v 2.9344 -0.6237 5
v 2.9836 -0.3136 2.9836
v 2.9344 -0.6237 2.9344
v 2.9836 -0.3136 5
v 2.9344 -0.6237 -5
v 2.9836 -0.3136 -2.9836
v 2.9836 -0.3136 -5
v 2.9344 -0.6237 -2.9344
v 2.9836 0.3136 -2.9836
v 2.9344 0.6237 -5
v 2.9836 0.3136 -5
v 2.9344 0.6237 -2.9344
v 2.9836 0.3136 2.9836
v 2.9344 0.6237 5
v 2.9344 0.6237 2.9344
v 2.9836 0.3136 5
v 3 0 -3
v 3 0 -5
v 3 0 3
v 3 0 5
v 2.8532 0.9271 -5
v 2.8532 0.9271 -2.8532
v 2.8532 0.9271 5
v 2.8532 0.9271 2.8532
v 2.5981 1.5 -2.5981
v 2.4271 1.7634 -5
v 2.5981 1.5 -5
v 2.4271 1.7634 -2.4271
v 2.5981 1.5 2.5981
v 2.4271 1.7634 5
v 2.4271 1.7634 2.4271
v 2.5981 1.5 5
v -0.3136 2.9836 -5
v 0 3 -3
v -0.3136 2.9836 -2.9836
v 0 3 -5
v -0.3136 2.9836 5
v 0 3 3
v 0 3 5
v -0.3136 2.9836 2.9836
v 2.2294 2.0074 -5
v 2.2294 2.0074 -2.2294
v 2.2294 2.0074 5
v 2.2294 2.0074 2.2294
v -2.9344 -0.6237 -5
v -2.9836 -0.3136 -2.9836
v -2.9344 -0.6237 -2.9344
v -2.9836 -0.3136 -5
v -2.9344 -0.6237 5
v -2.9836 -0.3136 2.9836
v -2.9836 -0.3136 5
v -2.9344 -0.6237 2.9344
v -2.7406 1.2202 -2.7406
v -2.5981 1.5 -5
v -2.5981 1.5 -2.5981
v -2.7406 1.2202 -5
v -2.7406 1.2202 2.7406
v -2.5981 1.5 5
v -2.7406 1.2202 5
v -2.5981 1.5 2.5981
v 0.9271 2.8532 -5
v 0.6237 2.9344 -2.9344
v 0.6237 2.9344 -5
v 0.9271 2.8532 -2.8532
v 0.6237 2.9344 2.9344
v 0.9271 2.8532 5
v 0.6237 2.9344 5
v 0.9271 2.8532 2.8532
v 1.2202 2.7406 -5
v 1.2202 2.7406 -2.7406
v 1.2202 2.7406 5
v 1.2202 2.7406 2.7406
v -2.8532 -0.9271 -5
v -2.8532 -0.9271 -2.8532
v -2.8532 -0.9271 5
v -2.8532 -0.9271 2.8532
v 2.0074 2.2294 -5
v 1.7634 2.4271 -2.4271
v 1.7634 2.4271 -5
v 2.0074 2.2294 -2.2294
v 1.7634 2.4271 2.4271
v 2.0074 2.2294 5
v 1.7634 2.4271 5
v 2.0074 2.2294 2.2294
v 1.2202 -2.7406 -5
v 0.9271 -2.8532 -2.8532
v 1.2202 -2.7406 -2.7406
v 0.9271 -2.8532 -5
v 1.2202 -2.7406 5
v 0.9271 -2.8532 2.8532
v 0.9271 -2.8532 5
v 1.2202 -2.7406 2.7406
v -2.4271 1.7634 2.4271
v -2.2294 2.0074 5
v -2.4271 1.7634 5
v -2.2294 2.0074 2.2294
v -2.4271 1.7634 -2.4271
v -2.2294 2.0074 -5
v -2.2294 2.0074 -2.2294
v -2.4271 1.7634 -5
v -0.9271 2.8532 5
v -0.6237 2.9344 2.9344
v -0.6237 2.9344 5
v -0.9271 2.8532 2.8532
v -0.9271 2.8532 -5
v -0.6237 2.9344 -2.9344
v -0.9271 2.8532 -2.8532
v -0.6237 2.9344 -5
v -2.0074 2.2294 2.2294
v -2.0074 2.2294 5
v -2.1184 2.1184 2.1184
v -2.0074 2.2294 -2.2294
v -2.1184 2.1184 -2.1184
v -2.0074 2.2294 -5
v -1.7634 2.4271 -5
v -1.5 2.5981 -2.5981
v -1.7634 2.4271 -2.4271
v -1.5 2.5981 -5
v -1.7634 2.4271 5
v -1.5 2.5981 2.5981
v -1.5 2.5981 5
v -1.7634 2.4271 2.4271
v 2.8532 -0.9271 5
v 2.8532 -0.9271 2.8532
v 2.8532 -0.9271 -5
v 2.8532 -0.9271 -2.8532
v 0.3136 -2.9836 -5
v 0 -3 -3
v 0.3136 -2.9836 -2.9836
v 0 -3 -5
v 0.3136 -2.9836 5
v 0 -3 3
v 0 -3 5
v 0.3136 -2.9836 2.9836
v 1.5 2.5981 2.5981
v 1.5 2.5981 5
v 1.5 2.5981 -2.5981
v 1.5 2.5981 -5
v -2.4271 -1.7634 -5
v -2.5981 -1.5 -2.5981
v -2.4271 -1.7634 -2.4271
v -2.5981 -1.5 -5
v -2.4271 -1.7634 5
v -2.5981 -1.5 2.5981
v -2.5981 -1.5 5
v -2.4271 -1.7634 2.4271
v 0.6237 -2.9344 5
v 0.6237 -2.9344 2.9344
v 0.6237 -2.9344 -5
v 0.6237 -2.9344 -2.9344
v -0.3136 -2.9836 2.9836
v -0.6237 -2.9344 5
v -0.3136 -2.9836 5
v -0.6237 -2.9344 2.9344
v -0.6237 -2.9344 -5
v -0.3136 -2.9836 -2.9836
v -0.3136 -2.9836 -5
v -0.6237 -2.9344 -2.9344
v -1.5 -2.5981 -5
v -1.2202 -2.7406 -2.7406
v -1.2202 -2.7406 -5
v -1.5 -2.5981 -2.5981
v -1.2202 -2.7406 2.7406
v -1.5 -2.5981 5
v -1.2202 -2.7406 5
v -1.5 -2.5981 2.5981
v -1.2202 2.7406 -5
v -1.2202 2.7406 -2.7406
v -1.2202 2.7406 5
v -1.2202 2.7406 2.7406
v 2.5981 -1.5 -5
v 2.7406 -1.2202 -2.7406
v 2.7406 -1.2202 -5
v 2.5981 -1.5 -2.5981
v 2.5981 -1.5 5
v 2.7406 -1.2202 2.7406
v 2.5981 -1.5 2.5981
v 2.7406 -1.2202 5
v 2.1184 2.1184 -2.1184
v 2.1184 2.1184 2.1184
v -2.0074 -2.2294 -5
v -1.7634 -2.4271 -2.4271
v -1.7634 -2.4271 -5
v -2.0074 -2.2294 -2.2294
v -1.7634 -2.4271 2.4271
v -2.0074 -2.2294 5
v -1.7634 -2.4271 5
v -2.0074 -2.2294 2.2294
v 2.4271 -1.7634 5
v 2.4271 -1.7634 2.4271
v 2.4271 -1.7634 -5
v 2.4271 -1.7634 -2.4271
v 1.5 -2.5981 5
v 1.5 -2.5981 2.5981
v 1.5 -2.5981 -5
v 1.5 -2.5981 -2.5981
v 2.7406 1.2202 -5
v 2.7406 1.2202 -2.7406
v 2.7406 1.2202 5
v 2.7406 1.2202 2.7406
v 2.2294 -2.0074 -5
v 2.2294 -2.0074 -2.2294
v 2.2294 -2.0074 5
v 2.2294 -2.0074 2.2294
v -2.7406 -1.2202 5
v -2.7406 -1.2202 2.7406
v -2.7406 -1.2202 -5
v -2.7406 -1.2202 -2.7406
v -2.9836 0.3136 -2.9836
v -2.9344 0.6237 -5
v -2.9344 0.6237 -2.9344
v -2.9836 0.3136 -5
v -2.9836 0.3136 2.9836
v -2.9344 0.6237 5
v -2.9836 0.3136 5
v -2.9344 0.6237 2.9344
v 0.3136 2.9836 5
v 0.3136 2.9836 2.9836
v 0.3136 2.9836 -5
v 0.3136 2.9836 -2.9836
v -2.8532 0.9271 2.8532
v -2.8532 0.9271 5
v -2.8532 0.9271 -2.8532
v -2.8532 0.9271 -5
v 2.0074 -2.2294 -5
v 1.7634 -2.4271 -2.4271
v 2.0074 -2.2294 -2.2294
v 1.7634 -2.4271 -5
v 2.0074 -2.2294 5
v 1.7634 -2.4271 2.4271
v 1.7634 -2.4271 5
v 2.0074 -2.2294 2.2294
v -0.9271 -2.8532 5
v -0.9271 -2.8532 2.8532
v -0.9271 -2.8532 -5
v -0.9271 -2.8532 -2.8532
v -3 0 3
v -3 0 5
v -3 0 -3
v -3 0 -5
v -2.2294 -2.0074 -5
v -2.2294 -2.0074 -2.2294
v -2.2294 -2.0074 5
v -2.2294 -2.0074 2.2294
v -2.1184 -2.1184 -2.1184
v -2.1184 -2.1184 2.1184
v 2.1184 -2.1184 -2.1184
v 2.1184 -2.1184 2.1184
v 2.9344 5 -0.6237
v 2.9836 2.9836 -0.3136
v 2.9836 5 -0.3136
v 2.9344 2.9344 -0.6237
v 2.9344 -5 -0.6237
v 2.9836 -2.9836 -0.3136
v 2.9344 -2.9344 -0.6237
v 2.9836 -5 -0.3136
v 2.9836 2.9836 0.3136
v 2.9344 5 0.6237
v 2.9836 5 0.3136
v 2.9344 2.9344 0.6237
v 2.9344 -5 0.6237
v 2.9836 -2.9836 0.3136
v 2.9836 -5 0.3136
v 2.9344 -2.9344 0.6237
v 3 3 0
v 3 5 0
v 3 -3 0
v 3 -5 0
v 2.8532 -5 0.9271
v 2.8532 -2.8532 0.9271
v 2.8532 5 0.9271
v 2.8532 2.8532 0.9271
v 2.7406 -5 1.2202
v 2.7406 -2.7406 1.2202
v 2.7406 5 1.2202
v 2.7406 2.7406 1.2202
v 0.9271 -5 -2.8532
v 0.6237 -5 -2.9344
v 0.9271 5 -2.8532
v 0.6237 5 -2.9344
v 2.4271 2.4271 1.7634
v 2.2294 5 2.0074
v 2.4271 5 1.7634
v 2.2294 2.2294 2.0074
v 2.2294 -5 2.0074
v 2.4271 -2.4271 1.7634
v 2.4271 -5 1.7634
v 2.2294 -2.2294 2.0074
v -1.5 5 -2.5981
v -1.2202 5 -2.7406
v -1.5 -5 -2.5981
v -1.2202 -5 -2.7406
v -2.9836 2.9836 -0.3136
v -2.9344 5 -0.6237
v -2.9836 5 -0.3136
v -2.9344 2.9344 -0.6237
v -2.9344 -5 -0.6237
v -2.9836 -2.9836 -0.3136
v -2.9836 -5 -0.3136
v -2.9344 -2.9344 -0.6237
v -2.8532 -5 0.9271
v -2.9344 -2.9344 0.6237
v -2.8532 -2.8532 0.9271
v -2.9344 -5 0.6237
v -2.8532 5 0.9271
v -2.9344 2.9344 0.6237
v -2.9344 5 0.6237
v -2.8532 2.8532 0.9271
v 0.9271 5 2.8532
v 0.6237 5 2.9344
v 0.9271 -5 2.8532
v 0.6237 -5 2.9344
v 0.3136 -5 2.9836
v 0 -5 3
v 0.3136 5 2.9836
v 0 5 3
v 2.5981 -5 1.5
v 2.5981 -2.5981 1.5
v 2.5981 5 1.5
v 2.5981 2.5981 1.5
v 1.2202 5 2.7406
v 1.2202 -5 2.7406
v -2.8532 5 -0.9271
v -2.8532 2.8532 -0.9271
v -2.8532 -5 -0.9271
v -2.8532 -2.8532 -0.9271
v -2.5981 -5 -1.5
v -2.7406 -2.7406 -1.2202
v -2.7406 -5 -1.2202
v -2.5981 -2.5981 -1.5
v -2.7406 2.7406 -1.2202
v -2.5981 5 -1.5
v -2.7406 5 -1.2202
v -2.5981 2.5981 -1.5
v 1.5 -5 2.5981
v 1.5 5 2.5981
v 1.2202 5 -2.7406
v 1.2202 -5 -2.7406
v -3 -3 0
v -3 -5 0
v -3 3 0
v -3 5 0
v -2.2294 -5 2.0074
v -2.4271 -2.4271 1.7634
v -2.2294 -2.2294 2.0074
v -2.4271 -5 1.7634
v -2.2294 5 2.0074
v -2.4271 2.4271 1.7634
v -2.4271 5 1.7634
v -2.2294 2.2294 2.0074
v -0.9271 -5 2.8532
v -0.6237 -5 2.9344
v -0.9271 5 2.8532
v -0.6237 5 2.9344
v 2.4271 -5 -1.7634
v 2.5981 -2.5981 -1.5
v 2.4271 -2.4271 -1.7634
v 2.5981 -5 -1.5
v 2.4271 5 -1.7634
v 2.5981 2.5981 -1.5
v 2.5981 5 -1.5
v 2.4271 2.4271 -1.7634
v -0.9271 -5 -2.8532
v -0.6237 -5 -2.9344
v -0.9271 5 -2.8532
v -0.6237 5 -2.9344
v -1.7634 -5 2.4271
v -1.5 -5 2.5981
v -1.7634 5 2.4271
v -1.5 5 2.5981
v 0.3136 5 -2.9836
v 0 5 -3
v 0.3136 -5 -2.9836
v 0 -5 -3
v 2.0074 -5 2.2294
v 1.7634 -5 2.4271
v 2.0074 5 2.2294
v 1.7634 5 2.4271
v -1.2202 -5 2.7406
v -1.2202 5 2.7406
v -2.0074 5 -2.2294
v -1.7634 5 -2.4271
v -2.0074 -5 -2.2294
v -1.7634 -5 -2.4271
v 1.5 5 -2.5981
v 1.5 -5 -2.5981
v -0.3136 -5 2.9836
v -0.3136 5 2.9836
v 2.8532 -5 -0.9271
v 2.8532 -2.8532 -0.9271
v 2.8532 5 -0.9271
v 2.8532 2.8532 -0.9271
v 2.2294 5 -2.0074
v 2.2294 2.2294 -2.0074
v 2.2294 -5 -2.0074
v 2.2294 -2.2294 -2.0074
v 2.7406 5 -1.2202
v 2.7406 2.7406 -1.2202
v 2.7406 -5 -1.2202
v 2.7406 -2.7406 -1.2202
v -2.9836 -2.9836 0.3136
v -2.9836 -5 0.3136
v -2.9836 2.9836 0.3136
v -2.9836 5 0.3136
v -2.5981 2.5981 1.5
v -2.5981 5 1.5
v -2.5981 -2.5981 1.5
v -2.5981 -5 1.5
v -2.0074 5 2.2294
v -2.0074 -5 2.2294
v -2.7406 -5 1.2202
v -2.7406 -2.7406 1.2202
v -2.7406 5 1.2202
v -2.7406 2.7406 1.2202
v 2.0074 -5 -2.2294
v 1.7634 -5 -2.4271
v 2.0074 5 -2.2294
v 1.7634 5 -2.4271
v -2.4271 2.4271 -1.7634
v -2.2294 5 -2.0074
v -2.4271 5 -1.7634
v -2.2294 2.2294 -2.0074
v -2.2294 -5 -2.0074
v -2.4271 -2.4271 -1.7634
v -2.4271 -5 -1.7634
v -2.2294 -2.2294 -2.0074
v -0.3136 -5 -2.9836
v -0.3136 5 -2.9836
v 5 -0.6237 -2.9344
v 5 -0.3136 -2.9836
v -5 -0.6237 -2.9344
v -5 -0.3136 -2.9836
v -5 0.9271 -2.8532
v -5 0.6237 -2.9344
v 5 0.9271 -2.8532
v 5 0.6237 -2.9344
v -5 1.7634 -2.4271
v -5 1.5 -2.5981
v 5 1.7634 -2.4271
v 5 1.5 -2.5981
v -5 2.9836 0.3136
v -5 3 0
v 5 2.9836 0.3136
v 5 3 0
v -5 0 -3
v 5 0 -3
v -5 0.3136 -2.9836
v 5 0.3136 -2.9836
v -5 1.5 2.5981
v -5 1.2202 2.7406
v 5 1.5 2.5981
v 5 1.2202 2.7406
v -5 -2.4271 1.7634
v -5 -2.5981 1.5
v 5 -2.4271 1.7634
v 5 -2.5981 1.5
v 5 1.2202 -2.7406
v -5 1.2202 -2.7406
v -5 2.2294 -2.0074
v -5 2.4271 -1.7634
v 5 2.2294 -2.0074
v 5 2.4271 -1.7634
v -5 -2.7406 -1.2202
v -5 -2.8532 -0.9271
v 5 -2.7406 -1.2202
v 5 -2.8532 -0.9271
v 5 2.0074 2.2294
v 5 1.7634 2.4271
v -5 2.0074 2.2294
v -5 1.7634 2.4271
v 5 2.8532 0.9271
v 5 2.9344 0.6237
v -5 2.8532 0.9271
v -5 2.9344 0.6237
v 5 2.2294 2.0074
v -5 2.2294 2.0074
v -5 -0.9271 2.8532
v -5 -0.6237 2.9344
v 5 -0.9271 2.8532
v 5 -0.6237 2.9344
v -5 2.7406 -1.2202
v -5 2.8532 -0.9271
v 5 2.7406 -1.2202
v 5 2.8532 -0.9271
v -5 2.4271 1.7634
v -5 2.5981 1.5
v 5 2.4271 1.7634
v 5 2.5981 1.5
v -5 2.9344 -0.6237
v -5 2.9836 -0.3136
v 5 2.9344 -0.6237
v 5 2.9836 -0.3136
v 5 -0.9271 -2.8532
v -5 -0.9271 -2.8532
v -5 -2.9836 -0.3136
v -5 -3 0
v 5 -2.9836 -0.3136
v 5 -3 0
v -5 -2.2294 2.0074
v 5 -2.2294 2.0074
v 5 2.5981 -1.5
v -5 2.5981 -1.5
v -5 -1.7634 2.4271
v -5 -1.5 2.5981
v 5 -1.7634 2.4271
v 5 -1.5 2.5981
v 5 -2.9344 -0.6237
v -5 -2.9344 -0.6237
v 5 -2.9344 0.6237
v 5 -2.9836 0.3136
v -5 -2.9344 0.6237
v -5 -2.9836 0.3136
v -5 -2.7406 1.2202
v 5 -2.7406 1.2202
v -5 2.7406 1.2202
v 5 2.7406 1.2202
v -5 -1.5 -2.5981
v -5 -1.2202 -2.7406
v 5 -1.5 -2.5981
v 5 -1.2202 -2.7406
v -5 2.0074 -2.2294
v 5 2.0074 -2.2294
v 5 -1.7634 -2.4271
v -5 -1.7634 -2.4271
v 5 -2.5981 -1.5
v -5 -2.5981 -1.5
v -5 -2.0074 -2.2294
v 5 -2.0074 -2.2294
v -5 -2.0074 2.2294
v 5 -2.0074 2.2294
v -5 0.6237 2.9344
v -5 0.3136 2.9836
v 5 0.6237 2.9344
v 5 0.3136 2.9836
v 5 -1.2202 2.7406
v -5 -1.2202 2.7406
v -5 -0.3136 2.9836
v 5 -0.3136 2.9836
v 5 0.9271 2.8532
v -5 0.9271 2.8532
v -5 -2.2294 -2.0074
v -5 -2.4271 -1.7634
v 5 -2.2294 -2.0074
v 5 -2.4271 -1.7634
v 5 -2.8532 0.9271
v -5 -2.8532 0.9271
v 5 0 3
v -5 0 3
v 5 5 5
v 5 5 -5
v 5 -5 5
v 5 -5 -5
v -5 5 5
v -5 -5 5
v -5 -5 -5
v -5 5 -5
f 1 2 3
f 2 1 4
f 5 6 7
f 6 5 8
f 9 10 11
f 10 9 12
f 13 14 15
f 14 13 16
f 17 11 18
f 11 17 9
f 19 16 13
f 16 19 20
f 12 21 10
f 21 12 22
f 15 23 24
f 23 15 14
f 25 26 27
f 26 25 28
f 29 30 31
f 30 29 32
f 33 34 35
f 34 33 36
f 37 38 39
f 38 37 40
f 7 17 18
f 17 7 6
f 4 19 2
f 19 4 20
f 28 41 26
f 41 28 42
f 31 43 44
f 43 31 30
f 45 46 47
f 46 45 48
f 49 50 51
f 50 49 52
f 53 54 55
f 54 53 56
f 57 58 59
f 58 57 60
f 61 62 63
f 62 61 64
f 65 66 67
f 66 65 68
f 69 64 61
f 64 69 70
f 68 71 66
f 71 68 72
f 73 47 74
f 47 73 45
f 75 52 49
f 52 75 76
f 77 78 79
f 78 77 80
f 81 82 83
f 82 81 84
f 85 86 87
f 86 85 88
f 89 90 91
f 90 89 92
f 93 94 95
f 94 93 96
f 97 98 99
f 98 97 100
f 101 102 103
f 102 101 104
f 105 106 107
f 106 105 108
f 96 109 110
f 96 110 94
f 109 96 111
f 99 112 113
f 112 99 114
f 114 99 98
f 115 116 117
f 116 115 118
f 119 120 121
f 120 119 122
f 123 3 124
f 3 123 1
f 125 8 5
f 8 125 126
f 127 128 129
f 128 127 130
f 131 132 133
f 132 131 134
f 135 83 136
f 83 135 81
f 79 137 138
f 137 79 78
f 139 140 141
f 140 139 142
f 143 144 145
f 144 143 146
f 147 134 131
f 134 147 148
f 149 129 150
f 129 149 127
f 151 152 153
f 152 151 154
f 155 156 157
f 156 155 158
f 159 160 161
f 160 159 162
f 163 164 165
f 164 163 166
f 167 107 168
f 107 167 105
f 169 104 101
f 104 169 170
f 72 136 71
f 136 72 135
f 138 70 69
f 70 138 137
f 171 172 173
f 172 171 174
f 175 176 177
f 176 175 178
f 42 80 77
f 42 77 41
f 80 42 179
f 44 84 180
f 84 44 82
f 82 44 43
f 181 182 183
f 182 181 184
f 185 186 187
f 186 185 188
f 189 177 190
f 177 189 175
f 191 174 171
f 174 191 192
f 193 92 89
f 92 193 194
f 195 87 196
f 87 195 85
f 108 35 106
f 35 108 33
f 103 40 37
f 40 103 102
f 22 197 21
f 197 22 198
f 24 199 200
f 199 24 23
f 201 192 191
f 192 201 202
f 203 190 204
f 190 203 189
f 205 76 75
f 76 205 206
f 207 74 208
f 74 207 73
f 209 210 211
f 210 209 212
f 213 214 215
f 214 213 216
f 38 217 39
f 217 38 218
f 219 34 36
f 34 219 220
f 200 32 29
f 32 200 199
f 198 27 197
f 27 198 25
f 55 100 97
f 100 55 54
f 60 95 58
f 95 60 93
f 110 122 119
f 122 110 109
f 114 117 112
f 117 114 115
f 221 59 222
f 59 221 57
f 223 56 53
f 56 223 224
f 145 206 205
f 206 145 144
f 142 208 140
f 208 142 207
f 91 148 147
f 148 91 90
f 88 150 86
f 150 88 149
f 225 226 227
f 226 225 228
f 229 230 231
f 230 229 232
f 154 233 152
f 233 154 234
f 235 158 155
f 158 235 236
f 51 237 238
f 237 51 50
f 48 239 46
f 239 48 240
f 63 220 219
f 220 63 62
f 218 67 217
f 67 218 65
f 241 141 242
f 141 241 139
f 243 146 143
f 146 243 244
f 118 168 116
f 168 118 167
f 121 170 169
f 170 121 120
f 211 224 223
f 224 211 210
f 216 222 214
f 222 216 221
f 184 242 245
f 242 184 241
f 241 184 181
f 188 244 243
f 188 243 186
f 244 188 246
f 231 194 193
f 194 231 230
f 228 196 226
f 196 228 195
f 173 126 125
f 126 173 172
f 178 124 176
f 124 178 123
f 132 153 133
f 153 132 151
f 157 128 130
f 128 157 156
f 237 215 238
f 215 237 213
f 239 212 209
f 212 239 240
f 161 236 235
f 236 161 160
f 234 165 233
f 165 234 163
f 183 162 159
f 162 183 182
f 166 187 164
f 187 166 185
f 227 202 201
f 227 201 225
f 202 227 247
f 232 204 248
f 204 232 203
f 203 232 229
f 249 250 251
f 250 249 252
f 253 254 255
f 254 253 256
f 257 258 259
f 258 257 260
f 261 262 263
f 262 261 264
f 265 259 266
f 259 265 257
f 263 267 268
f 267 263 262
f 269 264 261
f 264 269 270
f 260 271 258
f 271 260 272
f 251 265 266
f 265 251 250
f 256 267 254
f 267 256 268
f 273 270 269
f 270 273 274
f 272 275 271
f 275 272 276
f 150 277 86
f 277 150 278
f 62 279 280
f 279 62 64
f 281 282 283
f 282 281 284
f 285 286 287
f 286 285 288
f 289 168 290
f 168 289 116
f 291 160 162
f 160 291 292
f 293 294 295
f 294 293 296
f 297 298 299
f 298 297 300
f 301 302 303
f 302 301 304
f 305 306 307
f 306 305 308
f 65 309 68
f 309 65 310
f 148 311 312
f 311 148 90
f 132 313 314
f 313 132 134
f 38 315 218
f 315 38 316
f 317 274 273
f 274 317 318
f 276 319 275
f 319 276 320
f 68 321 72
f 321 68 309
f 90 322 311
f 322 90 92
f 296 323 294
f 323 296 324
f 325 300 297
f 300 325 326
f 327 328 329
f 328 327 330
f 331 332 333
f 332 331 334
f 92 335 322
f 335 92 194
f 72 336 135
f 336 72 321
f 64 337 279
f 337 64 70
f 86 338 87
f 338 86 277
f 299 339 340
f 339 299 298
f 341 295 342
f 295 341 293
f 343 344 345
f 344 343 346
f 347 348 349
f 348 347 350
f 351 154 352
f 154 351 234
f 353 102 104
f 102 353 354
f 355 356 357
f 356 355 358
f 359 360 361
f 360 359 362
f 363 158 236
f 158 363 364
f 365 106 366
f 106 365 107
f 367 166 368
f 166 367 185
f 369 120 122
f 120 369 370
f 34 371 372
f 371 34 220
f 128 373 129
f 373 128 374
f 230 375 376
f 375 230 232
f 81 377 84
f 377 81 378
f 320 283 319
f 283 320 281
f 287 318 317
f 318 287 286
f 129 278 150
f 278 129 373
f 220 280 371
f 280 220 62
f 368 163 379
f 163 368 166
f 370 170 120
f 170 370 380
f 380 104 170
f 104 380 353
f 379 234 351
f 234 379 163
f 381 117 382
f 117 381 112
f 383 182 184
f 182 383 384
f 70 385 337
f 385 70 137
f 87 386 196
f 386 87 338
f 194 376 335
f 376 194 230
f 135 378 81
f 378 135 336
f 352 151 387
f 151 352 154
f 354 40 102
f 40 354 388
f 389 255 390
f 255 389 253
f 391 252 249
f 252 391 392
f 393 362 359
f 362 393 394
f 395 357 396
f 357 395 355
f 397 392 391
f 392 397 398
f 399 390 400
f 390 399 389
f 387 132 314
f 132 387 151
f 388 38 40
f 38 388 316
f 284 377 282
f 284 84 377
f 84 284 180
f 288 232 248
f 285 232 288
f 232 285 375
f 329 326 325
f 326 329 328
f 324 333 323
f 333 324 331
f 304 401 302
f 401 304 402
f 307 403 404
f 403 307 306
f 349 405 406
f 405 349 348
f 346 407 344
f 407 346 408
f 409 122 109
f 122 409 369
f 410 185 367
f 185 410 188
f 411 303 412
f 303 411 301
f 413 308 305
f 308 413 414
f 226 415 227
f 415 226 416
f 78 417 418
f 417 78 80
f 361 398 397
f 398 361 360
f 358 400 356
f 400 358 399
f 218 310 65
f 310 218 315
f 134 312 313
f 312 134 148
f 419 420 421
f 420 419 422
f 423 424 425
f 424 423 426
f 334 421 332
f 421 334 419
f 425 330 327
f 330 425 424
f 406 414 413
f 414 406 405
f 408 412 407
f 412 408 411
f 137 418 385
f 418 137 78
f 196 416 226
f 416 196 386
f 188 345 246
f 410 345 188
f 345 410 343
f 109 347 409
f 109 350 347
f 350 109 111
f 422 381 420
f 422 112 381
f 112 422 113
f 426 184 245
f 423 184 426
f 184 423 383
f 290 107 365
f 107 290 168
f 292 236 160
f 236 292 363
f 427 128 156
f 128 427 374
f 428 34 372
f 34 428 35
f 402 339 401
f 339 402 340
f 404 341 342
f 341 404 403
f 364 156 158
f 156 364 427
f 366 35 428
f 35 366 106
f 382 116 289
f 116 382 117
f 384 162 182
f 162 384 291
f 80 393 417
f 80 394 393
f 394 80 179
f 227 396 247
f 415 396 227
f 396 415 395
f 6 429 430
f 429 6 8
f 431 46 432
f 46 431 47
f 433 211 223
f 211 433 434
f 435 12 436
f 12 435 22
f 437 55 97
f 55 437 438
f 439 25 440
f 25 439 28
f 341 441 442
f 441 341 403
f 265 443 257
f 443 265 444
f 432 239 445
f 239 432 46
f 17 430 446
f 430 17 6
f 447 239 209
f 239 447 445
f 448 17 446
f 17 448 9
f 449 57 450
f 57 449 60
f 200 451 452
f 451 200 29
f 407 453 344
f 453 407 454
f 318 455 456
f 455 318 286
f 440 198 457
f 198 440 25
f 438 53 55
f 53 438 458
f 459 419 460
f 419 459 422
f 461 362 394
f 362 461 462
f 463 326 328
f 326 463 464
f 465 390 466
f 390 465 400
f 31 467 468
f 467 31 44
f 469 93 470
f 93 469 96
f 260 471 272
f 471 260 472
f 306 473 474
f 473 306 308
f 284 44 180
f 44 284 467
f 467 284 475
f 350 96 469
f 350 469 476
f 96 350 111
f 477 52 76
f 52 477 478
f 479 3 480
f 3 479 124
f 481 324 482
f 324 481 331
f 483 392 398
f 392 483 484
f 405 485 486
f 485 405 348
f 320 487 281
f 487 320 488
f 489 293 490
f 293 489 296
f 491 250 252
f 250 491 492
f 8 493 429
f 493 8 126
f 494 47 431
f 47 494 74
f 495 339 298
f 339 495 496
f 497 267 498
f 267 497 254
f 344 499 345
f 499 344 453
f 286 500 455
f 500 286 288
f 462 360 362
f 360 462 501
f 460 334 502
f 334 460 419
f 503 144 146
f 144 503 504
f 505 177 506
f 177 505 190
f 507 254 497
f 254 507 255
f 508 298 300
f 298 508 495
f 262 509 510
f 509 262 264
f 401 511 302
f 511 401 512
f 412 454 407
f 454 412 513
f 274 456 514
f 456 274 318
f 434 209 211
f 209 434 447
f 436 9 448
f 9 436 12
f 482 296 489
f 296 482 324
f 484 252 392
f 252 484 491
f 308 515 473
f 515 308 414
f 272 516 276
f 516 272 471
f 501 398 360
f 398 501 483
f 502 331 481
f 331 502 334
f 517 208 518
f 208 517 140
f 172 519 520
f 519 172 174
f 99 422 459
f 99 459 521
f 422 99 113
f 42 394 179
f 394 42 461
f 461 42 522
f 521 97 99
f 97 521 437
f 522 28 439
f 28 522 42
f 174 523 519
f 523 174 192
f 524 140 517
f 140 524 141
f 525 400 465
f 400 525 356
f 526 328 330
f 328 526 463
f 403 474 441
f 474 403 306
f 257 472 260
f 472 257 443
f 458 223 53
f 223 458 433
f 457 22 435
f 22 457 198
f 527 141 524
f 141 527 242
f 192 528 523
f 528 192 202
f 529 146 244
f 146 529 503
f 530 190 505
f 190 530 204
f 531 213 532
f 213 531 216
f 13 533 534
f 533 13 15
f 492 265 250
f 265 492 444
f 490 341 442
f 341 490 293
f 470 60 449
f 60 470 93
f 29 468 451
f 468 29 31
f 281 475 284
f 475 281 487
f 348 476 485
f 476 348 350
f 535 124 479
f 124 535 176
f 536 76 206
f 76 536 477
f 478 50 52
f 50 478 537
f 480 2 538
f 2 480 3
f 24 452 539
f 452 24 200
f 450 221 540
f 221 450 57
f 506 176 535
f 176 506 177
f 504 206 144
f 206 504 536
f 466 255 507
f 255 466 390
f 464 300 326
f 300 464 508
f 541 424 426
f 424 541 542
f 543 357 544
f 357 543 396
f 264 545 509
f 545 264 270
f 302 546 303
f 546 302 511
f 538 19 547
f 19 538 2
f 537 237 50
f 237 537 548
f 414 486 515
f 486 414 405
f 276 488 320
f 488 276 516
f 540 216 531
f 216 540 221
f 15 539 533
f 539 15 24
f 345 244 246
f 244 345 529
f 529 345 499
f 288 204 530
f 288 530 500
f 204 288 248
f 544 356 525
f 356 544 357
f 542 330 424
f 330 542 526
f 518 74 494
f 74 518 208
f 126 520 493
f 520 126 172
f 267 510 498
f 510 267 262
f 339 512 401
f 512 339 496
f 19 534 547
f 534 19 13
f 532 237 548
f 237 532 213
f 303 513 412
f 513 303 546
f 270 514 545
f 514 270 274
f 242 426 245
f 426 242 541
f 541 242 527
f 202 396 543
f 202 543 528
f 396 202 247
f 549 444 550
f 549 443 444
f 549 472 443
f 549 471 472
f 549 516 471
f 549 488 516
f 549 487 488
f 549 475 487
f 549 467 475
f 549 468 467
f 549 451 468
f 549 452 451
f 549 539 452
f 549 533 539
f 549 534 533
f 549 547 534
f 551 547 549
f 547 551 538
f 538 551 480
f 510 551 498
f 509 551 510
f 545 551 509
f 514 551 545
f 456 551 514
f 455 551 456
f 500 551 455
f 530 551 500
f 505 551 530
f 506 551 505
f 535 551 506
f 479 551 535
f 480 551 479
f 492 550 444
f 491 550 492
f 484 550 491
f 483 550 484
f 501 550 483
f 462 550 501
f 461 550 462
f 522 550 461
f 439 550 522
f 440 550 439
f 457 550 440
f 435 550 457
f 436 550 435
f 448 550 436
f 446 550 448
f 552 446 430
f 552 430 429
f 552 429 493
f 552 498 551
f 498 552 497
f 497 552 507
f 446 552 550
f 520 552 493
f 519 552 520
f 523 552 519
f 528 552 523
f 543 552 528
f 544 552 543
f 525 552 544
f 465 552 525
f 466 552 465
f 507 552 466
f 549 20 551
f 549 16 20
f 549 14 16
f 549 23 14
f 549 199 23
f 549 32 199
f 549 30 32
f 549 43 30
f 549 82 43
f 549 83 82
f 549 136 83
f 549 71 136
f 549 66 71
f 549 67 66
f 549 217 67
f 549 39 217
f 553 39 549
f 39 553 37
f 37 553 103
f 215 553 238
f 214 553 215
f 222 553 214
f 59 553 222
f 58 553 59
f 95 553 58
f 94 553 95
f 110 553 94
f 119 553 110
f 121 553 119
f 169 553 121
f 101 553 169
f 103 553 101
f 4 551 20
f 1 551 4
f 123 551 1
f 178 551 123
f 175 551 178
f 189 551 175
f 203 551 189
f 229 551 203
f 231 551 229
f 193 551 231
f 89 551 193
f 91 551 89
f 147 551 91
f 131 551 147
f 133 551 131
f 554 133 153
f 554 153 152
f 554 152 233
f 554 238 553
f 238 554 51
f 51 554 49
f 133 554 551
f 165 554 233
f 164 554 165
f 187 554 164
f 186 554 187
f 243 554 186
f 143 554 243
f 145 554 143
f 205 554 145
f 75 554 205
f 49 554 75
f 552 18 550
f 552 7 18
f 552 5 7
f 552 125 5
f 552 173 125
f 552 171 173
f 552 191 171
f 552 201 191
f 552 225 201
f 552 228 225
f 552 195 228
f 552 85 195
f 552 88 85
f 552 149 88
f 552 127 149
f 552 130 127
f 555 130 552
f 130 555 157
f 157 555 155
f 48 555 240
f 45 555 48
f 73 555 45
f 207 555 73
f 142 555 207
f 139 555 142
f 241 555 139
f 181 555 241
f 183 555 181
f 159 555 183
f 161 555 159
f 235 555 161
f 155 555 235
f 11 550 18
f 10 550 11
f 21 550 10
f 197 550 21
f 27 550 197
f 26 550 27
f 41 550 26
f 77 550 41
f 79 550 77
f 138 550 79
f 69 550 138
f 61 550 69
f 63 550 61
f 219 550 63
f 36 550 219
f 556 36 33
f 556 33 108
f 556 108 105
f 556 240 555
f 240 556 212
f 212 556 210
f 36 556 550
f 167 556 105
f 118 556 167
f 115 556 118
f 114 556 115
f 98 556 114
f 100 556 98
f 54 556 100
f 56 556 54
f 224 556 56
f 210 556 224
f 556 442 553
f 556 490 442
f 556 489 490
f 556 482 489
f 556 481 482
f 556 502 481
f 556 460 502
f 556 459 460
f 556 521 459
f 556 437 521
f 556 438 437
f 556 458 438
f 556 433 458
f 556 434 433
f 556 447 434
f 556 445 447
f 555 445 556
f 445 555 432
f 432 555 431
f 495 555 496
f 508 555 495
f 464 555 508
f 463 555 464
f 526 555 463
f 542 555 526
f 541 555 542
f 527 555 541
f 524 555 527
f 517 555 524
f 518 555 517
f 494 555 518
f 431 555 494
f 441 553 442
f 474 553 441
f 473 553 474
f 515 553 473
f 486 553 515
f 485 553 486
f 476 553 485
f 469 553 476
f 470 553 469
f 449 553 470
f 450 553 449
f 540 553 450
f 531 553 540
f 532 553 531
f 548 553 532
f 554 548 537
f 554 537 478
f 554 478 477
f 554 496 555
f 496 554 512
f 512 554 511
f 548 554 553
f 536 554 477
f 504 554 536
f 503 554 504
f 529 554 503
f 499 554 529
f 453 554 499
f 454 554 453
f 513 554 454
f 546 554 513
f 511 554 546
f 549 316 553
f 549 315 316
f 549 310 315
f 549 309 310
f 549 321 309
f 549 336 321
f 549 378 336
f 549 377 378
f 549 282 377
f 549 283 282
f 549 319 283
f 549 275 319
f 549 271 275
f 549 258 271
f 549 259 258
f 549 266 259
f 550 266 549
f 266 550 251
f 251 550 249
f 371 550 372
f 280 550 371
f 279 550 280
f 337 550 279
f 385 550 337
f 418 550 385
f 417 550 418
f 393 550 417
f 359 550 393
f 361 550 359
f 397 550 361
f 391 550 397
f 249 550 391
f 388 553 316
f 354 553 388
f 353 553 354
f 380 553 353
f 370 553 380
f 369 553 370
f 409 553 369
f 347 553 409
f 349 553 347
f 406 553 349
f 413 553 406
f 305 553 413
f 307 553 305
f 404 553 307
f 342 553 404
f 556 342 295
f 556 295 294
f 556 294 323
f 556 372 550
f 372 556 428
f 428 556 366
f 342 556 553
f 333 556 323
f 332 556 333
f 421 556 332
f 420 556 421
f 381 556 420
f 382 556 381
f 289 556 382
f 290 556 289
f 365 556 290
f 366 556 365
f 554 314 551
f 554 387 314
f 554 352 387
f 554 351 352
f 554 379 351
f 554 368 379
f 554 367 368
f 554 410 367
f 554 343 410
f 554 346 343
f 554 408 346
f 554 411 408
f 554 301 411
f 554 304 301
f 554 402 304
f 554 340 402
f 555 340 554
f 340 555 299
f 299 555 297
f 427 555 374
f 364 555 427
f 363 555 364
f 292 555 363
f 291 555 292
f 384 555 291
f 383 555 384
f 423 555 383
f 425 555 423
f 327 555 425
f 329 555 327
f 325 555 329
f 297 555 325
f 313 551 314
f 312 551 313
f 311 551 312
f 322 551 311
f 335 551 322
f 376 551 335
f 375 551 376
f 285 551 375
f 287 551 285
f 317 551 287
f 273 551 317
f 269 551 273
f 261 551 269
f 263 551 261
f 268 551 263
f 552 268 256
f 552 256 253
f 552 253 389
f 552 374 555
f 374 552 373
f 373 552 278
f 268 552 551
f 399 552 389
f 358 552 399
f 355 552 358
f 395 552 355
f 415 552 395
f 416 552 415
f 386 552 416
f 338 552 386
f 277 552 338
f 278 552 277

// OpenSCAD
$fs=0.25;$fa=6;
rotate([0,0,0])difference(){rotate([0,0,0])cube([10,10,10],center=true);
rotate([0,0,0])union() {
rotate([0,0,0])union() {
rotate([0,0,0])cylinder(h=11, r=3, center=true);
rotate([90,0,0])cylinder(h=11, r=3, center=true);
}
rotate([0,90,0])cylinder(h=11, r=3, center=true);
}
}
